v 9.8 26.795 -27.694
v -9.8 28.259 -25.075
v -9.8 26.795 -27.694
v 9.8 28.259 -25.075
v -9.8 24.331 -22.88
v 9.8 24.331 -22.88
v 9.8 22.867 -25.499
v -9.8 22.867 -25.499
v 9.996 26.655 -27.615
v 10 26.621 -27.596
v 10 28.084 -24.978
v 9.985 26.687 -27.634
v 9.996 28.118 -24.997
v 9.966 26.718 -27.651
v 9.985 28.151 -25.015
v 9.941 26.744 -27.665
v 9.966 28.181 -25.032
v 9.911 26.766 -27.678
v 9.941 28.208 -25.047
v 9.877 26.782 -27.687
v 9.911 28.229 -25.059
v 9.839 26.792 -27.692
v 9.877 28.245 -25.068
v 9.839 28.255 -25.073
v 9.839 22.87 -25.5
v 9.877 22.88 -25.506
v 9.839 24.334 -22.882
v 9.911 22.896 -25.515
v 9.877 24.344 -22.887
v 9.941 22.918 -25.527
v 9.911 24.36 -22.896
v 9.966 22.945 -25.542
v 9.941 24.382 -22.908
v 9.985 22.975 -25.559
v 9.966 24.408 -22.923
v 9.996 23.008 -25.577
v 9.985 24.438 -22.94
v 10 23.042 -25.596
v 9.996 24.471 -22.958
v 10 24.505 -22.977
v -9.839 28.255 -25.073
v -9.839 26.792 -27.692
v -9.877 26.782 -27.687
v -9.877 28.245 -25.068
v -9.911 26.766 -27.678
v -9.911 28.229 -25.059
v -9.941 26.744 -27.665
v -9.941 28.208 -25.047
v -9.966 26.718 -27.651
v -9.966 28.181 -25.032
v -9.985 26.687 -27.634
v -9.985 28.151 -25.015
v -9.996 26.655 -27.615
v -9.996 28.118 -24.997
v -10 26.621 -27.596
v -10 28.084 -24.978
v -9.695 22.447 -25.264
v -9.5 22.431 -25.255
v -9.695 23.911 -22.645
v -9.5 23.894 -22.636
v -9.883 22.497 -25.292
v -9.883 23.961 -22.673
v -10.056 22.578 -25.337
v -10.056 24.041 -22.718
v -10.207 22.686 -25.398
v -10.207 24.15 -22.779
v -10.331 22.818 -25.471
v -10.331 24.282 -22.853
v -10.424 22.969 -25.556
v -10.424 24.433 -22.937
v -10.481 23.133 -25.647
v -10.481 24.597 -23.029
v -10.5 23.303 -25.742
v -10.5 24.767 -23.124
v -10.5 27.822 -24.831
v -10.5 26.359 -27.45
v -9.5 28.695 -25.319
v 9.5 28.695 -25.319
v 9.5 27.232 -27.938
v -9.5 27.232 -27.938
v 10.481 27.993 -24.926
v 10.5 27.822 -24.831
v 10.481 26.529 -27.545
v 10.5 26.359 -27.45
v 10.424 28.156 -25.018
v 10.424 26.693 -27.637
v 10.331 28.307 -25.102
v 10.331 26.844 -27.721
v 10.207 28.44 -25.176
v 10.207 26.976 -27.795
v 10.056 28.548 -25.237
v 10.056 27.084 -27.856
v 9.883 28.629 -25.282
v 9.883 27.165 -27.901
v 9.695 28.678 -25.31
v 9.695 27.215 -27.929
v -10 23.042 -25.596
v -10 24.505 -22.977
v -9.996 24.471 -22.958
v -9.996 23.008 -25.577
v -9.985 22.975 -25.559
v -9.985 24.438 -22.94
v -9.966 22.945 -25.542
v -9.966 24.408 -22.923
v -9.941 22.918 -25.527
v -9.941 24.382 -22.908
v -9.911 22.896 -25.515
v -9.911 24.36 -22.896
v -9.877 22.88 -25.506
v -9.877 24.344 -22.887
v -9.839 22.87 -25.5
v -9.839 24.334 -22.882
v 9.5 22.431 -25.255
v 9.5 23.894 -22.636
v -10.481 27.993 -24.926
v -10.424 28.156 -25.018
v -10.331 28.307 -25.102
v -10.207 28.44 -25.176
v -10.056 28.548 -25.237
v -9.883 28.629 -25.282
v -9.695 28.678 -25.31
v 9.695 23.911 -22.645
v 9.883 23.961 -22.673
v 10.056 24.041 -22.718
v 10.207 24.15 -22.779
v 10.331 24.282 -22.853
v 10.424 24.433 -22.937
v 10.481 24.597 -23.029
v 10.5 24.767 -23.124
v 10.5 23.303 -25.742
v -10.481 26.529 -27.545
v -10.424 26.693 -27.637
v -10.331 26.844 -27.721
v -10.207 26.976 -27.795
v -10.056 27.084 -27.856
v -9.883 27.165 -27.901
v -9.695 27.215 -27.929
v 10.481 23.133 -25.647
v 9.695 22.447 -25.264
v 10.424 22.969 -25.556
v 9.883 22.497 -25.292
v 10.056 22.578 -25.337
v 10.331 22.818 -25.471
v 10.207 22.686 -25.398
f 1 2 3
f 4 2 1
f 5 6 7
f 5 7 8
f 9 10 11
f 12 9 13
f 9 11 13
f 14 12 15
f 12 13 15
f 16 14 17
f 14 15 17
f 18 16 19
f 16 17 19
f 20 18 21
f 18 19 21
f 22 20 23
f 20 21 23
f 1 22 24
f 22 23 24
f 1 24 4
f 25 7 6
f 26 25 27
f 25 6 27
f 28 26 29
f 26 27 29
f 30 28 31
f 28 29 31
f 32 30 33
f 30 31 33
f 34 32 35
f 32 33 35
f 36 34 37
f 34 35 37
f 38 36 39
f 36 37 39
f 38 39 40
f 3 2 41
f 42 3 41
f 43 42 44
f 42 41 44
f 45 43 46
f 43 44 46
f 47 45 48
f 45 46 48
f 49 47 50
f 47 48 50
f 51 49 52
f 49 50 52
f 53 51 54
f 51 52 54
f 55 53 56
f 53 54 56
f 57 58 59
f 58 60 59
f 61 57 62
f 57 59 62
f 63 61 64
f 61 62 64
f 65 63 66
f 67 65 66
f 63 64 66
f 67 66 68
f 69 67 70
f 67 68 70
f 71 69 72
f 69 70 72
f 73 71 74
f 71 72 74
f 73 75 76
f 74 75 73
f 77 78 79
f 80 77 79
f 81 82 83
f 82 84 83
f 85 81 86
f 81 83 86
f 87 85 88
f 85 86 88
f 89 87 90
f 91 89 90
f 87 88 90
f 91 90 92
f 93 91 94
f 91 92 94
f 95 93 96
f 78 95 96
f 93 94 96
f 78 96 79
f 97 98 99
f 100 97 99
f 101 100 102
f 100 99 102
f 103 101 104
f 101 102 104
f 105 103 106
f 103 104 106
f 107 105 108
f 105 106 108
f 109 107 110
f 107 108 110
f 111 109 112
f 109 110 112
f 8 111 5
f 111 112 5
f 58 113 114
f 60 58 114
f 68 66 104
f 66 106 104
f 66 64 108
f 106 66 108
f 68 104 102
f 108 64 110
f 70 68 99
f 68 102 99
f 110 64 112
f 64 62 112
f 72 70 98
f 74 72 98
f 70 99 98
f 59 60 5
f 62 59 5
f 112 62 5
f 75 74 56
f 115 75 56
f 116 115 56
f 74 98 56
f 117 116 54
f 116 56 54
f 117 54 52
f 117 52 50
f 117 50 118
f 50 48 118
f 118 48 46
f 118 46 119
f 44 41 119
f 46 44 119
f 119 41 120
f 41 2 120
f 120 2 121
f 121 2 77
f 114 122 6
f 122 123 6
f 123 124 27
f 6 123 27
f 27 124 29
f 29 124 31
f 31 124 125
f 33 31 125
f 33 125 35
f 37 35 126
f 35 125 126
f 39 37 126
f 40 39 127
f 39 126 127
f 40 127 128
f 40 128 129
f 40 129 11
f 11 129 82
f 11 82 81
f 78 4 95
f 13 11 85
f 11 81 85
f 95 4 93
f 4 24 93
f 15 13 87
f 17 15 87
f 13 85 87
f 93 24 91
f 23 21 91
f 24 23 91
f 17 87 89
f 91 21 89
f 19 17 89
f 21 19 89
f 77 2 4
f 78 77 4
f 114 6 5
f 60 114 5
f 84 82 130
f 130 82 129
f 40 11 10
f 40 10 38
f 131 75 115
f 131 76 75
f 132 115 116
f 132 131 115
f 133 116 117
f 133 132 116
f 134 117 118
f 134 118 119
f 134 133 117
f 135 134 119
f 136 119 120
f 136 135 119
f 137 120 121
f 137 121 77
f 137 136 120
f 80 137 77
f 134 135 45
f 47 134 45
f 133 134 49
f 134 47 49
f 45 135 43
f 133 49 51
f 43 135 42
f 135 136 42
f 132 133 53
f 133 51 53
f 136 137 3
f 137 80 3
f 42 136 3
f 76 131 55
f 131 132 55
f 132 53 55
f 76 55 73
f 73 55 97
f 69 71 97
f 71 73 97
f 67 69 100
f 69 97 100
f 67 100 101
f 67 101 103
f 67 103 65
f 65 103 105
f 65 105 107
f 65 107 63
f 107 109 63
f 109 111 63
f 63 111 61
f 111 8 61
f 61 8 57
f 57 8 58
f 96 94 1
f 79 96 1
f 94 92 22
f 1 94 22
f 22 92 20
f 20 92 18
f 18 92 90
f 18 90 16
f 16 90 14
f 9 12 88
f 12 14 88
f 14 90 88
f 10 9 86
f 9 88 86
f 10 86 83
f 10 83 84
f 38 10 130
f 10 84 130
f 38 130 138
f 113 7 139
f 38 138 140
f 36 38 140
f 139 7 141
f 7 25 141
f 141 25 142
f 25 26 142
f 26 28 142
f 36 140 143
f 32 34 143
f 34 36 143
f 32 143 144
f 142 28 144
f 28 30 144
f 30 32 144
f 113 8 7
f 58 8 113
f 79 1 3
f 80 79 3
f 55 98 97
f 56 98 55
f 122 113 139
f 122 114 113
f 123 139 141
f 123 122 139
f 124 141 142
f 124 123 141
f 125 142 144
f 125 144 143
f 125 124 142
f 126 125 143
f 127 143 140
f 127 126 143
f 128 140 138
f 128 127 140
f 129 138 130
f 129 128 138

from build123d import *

# Parameters (mm, degrees)
PAD011_DEPTH    = 10.5
POCKET010_DEPTH = 5
FILLET005_R     = 1


with BuildPart() as part:
    # Sketch055 → Pad011 (new body, symmetric)
    with BuildSketch(Plane.YZ):
        Polygon((23.8941280101, -22.635866082), (28.6951768598, -25.3191346005), (27.2315758497, -27.9378885186), (22.430527, -25.25462), align=None)
    extrude(amount=PAD011_DEPTH, both=True)

    # Sketch056 (on Face1 of Pad011) → Pocket010 (cut)
    with BuildSketch(Plane(origin=(0, -3.9527461257, -7.0724666982), x_dir=(0, -0.8729179727, 0.4878670034), z_dir=(0, 0.4878670034, 0.8729179727))):
        with BuildLine():
            Line((-36.7009059356, 10), (-32.6009059356, 10))
            ThreePointArc((-32.4009059356, 9.8), (-32.4594845794, 9.9414213562), (-32.6009059356, 10))
            Line((-32.4009059356, 9.8), (-32.4009059356, -9.8))
            ThreePointArc((-32.6009059356, -10), (-32.4594845794, -9.9414213562), (-32.4009059356, -9.8))
            Line((-32.6009059356, -10), (-36.7009059356, -10))
            ThreePointArc((-36.9009059356, -9.8), (-36.8423272919, -9.9414213562), (-36.7009059356, -10))
            Line((-36.9009059356, -9.8), (-36.9009059356, 9.8))
            ThreePointArc((-36.7009059356, 10), (-36.8423272919, 9.9414213562), (-36.9009059356, 9.8))
        make_face()
    extrude(amount=-POCKET010_DEPTH, mode=Mode.SUBTRACT)

    # Fillet005
    fillet005_edges = [part.edges().sort_by_distance(p)[0] for p in [
        (10.5, 27.963376, -26.628512),
        (10.5, 23.162328, -23.945243),
        (-10.5, 27.963376, -26.628512),
        (-10.5, 23.162328, -23.945243),
    ]]
    fillet(fillet005_edges, radius=FILLET005_R)


solid = part.part
